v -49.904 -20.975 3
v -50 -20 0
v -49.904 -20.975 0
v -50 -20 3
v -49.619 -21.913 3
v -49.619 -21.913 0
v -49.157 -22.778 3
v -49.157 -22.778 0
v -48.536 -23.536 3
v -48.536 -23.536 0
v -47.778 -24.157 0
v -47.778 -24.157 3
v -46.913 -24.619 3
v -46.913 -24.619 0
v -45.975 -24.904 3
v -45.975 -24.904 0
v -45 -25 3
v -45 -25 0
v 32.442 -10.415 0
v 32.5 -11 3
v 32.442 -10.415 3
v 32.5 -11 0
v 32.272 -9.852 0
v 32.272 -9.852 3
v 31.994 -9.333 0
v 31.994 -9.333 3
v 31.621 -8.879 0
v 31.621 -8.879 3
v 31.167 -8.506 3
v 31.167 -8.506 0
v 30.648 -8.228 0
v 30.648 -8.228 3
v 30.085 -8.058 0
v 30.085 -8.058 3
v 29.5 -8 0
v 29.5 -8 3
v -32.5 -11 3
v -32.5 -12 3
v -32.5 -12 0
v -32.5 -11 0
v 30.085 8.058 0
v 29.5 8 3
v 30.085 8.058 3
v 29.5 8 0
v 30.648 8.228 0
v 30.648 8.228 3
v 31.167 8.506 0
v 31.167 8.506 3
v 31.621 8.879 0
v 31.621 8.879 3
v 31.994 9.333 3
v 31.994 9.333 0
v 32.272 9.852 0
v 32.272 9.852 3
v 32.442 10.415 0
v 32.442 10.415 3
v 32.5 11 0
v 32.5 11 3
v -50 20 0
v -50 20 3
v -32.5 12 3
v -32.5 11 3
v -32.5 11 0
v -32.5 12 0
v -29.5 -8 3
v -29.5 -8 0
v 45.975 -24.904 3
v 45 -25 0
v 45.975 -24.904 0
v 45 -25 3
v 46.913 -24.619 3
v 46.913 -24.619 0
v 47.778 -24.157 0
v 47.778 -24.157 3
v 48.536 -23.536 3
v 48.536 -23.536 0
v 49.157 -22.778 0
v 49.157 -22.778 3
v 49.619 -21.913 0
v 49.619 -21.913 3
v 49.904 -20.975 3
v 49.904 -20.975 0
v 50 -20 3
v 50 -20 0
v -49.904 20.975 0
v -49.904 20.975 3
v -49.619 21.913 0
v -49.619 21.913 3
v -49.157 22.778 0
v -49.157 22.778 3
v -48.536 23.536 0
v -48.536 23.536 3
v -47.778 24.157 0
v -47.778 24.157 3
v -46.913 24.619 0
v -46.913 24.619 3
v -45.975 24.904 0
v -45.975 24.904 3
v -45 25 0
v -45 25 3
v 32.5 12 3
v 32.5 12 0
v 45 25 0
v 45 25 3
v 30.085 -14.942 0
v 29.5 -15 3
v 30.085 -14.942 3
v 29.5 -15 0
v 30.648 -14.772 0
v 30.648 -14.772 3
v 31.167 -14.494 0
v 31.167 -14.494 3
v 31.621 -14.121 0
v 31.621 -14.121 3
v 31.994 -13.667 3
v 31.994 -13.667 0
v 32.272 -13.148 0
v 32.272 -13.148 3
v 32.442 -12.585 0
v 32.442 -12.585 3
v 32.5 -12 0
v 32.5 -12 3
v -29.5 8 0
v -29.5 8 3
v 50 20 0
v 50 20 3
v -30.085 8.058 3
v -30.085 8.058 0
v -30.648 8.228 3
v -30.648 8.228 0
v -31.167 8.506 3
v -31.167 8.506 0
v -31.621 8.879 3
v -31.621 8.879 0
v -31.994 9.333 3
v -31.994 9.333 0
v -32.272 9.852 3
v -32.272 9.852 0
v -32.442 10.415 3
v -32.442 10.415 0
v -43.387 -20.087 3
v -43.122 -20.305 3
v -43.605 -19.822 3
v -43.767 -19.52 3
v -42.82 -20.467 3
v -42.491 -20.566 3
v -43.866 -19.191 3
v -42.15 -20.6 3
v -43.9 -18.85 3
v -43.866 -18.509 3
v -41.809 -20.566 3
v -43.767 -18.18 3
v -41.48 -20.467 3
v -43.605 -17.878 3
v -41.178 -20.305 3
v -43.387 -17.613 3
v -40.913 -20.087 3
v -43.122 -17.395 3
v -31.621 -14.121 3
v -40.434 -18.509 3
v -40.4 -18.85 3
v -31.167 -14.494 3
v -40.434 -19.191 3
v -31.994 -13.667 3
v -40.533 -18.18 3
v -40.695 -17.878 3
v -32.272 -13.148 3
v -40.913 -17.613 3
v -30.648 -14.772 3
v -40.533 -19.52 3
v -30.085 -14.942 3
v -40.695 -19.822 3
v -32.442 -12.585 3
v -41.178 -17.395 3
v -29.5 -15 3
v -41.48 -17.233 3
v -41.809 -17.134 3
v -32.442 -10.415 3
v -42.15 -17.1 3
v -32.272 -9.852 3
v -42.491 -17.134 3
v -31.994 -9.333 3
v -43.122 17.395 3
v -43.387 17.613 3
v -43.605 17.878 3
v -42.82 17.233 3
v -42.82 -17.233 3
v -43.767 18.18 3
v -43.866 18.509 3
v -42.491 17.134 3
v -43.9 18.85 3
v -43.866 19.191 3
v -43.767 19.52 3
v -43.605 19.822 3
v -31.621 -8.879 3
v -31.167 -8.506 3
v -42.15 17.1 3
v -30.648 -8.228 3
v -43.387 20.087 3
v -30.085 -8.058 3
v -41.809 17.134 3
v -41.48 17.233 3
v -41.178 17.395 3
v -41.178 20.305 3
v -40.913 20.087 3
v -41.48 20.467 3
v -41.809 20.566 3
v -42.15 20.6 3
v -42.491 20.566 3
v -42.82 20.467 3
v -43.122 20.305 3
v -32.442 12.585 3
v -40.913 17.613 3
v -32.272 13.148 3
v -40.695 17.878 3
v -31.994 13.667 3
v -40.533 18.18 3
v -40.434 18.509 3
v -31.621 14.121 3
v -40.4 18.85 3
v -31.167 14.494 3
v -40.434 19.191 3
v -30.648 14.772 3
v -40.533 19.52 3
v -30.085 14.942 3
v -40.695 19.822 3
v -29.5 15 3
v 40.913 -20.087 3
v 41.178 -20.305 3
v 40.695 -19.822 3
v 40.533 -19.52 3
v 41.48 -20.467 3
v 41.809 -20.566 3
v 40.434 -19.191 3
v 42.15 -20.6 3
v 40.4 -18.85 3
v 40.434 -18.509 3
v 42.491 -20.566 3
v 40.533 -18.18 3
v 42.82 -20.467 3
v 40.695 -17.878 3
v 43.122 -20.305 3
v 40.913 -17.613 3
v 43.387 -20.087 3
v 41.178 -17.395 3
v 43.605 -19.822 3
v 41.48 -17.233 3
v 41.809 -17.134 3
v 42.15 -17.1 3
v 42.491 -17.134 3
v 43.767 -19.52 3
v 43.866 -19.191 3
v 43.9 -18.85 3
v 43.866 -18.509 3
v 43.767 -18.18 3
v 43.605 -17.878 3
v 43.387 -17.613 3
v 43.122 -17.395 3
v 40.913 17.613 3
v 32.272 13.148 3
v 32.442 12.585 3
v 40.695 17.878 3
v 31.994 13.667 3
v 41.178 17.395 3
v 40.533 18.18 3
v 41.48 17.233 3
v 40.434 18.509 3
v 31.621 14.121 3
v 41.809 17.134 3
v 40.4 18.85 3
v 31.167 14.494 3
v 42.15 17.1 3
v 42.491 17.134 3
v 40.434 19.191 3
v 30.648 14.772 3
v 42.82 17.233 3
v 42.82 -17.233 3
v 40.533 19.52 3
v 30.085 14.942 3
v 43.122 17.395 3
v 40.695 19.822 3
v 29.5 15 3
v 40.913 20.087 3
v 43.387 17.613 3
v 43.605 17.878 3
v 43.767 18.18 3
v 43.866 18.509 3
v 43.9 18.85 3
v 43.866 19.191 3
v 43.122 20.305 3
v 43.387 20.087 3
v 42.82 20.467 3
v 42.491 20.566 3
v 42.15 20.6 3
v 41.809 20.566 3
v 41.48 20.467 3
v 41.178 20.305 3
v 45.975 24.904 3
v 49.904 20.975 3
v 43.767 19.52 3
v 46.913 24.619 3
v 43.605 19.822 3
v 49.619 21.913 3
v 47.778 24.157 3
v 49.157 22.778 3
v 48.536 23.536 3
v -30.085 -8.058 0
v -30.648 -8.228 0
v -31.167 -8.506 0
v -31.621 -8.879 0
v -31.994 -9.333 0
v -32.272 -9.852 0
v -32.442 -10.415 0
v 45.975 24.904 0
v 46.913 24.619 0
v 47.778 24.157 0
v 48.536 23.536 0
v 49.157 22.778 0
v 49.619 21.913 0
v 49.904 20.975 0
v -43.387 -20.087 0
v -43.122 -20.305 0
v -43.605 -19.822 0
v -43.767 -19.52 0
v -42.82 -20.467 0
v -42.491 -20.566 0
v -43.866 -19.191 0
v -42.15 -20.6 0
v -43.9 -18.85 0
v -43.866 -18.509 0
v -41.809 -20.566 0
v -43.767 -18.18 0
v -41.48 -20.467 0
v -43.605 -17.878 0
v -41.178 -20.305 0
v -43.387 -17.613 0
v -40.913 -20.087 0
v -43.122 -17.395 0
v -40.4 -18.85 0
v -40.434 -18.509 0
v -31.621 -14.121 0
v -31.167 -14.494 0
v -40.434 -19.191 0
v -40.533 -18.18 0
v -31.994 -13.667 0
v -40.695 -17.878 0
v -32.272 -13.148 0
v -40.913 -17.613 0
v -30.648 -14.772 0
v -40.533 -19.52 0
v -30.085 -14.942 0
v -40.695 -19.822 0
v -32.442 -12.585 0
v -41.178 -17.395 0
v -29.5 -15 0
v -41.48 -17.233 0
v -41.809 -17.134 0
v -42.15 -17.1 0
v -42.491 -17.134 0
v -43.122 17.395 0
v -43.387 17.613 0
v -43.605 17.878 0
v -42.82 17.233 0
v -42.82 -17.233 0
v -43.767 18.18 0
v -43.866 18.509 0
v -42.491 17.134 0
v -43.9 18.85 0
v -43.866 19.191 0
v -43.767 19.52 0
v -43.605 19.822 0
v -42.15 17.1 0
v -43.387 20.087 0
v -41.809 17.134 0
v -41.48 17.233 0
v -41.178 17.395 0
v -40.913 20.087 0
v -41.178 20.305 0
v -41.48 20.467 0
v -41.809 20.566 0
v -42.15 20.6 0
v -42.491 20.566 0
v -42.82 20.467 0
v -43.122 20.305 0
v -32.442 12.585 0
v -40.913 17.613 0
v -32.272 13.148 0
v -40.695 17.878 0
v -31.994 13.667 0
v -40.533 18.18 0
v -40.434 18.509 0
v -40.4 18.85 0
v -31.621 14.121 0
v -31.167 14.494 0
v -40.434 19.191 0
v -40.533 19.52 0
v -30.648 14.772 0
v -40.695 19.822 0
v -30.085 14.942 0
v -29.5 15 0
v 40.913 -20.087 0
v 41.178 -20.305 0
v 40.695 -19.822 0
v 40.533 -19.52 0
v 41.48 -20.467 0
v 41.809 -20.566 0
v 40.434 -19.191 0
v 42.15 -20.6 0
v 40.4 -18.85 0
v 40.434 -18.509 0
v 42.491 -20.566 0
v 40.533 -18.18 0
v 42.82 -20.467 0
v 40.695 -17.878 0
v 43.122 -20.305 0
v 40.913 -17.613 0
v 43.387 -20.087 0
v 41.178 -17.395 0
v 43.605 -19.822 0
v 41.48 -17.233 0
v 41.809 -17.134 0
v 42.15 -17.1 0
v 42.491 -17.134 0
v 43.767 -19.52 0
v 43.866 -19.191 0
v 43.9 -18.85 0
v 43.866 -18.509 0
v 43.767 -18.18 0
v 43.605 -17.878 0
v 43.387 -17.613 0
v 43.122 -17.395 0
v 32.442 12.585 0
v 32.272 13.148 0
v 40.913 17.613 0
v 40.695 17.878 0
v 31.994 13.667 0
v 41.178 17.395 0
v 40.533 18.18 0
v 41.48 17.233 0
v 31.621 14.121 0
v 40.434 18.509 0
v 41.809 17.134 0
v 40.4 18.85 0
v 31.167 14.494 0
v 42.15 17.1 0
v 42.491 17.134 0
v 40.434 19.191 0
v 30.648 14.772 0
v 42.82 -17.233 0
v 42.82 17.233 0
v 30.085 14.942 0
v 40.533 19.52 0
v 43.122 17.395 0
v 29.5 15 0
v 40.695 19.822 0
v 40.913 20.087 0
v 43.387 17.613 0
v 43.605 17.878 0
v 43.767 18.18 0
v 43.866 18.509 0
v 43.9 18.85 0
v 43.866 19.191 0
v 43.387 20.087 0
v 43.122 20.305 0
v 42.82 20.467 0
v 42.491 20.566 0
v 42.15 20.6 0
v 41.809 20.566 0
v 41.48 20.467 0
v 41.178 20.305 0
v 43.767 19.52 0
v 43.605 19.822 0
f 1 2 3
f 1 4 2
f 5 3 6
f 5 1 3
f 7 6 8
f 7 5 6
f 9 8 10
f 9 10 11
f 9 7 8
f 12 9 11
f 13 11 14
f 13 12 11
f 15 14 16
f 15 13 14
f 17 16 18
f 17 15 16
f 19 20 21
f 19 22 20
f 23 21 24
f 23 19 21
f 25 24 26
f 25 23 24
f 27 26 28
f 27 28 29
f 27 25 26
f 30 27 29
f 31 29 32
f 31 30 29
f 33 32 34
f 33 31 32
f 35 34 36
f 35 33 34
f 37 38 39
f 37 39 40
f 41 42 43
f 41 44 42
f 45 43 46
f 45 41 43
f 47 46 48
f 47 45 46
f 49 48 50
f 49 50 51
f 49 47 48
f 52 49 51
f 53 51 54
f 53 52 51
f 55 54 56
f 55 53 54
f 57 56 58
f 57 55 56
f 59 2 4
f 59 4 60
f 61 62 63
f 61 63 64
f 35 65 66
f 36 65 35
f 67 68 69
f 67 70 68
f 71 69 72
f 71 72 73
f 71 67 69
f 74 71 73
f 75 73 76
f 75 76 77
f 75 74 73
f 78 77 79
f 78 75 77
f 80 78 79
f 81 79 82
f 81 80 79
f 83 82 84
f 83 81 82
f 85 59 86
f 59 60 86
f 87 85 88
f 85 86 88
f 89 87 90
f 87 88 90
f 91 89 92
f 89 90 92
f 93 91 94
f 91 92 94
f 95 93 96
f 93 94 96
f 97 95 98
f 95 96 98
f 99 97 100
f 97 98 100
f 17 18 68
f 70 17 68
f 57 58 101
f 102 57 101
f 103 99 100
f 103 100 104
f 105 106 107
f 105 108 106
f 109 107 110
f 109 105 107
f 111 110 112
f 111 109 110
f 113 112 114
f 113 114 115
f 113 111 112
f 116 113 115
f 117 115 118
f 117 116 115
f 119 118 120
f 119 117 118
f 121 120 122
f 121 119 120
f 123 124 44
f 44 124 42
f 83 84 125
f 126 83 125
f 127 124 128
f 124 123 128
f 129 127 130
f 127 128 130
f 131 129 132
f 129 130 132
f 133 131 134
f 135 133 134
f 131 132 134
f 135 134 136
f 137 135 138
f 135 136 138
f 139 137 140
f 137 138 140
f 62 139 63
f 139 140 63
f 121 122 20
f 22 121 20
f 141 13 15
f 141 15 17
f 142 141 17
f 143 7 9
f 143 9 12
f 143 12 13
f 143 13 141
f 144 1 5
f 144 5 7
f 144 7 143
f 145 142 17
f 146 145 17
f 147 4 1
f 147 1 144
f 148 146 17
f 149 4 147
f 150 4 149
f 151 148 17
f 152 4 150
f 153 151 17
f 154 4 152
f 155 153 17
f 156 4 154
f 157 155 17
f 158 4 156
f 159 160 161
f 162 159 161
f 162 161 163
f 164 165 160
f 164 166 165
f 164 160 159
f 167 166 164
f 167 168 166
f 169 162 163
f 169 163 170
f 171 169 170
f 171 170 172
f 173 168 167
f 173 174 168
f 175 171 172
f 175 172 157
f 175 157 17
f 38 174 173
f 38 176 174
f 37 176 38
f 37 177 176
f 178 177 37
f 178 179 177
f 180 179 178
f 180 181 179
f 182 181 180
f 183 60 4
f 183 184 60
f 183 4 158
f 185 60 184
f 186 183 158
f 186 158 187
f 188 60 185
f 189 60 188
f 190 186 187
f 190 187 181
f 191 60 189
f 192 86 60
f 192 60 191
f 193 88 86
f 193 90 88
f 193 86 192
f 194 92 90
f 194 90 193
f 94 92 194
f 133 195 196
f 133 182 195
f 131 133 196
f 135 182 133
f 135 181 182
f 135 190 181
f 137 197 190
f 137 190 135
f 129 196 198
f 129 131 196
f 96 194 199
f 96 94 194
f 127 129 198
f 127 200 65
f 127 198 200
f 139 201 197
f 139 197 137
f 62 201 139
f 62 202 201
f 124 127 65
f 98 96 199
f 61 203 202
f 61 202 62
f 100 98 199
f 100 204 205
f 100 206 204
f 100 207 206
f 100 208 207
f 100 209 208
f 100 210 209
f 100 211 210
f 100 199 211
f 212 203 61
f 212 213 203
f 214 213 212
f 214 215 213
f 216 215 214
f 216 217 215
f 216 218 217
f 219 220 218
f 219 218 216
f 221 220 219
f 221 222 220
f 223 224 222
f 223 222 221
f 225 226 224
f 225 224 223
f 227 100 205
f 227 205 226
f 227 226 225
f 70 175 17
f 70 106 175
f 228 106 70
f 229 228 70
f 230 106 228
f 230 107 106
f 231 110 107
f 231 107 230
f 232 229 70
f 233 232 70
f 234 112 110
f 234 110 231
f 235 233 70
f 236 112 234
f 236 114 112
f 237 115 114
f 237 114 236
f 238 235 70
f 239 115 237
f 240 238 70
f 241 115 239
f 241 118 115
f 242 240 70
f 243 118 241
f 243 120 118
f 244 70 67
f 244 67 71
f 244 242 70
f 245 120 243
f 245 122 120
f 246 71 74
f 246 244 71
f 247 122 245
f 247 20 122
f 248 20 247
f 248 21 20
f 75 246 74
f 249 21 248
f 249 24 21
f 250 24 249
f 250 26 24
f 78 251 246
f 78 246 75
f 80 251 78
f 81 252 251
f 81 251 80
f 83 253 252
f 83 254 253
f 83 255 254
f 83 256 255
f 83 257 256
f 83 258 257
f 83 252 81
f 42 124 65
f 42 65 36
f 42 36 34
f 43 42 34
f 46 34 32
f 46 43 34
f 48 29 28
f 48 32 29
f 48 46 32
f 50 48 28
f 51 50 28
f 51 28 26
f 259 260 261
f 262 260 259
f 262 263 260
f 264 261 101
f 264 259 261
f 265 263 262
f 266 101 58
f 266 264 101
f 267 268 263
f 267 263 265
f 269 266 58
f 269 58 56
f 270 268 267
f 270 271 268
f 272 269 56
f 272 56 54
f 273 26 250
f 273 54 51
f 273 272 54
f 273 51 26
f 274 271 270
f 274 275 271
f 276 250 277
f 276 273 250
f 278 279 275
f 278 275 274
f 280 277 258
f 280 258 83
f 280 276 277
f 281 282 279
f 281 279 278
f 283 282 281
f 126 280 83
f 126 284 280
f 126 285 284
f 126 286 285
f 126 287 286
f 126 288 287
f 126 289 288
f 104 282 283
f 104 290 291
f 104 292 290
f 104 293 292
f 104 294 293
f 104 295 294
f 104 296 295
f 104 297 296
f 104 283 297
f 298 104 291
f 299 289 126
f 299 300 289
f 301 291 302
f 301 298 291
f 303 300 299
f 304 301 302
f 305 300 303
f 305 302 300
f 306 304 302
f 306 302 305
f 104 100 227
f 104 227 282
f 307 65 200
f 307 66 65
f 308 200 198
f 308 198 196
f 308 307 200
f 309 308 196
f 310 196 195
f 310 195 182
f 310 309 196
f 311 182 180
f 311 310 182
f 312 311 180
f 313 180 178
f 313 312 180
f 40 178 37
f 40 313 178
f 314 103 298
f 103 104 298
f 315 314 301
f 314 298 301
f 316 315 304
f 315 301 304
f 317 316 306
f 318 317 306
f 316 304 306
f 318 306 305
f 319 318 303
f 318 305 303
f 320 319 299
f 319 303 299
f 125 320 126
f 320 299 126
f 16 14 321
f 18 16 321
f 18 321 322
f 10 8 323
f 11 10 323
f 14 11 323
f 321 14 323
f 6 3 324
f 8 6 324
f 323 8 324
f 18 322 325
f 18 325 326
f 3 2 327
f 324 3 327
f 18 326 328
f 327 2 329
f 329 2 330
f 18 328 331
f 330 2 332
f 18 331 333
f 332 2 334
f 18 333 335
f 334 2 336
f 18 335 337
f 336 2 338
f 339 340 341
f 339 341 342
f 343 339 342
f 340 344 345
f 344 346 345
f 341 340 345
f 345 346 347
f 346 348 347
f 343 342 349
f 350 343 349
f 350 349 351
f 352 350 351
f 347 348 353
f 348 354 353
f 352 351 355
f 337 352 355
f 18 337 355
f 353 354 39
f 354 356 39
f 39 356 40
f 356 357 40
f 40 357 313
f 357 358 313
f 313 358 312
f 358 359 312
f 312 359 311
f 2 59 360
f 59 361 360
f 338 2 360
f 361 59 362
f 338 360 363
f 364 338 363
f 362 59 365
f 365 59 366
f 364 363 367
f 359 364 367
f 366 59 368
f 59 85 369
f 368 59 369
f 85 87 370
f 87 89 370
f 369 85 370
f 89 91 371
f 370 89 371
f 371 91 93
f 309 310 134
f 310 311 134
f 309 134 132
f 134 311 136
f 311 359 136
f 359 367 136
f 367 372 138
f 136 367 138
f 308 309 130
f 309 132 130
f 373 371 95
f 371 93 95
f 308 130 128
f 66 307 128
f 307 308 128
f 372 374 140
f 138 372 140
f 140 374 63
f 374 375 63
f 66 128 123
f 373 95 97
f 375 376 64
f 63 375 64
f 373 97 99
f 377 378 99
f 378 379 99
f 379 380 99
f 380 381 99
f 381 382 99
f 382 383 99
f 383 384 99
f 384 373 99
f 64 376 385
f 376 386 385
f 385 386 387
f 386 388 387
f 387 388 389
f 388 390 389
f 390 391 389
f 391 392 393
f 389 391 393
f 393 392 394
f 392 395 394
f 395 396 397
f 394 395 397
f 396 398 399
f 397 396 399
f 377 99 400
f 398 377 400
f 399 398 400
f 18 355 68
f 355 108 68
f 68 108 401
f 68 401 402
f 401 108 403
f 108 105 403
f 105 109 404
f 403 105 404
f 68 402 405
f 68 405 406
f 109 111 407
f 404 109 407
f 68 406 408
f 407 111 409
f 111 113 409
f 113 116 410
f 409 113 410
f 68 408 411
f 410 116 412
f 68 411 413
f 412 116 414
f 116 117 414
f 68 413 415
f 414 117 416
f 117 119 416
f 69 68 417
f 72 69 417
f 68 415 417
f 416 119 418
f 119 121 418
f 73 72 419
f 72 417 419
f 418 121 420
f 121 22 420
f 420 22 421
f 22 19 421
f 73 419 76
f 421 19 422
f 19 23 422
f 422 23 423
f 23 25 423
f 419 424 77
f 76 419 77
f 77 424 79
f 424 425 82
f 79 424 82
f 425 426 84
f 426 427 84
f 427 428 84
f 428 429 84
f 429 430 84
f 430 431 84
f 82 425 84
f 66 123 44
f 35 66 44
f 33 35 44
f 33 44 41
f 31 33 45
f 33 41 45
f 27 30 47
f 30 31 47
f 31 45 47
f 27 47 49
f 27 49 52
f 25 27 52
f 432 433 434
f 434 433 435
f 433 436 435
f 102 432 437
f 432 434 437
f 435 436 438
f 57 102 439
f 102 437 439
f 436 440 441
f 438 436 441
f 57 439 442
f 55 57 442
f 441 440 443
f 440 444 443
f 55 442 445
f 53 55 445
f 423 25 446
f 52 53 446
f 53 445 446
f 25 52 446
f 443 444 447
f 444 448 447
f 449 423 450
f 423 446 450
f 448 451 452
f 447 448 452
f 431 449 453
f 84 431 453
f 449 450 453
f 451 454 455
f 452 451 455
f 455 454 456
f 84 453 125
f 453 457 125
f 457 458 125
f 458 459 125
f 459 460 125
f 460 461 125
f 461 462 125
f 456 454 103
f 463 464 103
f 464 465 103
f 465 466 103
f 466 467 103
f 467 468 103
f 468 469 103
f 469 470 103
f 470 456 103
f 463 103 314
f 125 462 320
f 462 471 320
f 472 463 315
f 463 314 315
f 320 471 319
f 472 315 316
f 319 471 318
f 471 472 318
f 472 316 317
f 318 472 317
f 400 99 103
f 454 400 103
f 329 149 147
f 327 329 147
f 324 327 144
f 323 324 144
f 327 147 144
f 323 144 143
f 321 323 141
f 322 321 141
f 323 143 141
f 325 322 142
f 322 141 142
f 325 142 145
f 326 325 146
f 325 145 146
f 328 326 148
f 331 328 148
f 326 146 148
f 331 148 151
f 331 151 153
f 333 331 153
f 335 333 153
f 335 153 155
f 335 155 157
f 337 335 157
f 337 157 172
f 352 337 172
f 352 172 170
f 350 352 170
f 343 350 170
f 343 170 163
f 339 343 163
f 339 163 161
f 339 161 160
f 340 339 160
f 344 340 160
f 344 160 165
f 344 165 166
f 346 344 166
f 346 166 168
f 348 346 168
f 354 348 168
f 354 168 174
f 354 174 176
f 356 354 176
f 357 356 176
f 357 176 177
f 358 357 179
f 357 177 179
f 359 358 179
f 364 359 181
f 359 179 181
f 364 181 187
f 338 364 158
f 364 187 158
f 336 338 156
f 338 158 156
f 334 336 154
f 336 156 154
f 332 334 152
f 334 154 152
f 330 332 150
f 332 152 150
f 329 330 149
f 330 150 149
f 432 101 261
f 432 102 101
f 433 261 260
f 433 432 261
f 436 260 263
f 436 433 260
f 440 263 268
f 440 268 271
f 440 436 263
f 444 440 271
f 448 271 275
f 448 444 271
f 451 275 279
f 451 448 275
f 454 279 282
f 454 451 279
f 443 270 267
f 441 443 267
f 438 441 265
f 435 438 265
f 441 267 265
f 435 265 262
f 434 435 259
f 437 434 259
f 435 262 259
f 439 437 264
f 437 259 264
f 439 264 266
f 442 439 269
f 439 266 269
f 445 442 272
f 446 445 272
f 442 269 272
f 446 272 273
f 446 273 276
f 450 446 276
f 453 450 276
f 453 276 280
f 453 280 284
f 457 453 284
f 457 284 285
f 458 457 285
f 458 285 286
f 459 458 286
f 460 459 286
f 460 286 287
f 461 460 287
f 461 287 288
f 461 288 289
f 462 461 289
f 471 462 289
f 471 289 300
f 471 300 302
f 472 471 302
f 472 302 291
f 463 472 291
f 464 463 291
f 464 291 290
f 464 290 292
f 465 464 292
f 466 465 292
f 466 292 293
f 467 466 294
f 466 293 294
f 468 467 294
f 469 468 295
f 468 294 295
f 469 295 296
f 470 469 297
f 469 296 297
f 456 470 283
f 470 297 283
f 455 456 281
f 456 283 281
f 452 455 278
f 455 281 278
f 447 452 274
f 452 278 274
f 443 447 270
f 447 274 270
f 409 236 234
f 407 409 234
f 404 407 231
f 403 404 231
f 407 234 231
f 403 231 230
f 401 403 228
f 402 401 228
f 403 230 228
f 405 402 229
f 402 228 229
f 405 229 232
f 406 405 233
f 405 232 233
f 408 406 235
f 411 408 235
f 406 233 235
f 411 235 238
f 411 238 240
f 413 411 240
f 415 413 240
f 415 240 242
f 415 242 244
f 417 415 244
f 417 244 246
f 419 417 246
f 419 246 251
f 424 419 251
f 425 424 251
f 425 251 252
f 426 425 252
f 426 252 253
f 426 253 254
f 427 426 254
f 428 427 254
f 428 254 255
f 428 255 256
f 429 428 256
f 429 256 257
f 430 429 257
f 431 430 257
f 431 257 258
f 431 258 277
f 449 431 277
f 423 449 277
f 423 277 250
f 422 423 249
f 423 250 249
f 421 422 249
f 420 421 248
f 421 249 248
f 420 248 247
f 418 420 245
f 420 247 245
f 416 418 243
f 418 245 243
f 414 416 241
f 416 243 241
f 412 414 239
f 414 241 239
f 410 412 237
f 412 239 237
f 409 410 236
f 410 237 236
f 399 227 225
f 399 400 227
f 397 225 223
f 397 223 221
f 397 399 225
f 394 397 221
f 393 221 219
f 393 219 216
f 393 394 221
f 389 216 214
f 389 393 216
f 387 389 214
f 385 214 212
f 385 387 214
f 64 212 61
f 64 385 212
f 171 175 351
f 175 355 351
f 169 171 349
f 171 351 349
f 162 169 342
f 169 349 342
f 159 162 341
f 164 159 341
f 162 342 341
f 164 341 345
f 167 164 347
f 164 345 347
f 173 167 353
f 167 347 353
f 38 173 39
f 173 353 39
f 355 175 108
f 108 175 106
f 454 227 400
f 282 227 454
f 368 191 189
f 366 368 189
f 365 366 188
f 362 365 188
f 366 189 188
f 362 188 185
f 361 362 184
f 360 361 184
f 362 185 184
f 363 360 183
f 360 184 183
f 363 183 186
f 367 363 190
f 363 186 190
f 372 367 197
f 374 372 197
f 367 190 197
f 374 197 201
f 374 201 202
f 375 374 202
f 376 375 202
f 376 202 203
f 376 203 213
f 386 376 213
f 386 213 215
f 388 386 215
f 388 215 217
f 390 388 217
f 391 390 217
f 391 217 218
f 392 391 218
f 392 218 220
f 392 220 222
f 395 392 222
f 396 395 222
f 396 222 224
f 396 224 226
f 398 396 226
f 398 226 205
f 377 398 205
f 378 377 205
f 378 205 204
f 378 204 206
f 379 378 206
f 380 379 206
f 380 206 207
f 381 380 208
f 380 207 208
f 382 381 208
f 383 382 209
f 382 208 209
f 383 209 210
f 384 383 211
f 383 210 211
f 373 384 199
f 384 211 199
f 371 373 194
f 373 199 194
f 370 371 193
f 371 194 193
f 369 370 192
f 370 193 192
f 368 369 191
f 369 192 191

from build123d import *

# Parameters (mm, degrees)
F0_W     = 100
F0_H     = 50
F1_DEPTH = 3
F2_D     = 3.5
F2_DEPTH = 16
F3_R     = 5
F4_W     = 65
F4_H     = 7
F5_DEPTH = 25
F6_R     = 3


with BuildPart() as f1:
    # F0 (on Top) → F1 (new body)
    with BuildSketch(Plane.XY):
        Rectangle(F0_W, F0_H)
    extrude(amount=F1_DEPTH)

    # F2
    with Locations(Plane(origin=(0, 0, 0), x_dir=(1, 0, 0), z_dir=(0, 0, -1))):
        with Locations((-42.15, 18.85), (-42.15, -18.85), (42.15, 18.85), (42.15, -18.85)):
            Hole(F2_D / 2, depth=F2_DEPTH)

    # F3
    f3_edges = [f1.edges().sort_by_distance(p)[0] for p in [
        (-50, 25, 1.5),
        (-50, -25, 1.5),
        (50, 25, 1.5),
        (50, -25, 1.5),
    ]]
    fillet(f3_edges, radius=F3_R)

    # F4 (on face) → F5 (cut)
    with BuildSketch(Plane.XY.offset(3)):
        with Locations((0, 11.5)):
            Rectangle(F4_W, F4_H)
        with Locations((0, -11.5)):
            Rectangle(F4_W, F4_H)
    extrude(amount=-F5_DEPTH, mode=Mode.SUBTRACT)

    # F6
    f6_edges = [f1.edges().sort_by_distance(p)[0] for p in [
        (-32.5, 15, 1.5),
        (-32.5, 8, 1.5),
        (-32.5, -15, 1.5),
        (32.5, 8, 1.5),
        (32.5, -15, 1.5),
        (32.5, 15, 1.5),
        (32.5, -8, 1.5),
        (-32.5, -8, 1.5),
    ]]
    fillet(f6_edges, radius=F6_R)


solid = f1.part
